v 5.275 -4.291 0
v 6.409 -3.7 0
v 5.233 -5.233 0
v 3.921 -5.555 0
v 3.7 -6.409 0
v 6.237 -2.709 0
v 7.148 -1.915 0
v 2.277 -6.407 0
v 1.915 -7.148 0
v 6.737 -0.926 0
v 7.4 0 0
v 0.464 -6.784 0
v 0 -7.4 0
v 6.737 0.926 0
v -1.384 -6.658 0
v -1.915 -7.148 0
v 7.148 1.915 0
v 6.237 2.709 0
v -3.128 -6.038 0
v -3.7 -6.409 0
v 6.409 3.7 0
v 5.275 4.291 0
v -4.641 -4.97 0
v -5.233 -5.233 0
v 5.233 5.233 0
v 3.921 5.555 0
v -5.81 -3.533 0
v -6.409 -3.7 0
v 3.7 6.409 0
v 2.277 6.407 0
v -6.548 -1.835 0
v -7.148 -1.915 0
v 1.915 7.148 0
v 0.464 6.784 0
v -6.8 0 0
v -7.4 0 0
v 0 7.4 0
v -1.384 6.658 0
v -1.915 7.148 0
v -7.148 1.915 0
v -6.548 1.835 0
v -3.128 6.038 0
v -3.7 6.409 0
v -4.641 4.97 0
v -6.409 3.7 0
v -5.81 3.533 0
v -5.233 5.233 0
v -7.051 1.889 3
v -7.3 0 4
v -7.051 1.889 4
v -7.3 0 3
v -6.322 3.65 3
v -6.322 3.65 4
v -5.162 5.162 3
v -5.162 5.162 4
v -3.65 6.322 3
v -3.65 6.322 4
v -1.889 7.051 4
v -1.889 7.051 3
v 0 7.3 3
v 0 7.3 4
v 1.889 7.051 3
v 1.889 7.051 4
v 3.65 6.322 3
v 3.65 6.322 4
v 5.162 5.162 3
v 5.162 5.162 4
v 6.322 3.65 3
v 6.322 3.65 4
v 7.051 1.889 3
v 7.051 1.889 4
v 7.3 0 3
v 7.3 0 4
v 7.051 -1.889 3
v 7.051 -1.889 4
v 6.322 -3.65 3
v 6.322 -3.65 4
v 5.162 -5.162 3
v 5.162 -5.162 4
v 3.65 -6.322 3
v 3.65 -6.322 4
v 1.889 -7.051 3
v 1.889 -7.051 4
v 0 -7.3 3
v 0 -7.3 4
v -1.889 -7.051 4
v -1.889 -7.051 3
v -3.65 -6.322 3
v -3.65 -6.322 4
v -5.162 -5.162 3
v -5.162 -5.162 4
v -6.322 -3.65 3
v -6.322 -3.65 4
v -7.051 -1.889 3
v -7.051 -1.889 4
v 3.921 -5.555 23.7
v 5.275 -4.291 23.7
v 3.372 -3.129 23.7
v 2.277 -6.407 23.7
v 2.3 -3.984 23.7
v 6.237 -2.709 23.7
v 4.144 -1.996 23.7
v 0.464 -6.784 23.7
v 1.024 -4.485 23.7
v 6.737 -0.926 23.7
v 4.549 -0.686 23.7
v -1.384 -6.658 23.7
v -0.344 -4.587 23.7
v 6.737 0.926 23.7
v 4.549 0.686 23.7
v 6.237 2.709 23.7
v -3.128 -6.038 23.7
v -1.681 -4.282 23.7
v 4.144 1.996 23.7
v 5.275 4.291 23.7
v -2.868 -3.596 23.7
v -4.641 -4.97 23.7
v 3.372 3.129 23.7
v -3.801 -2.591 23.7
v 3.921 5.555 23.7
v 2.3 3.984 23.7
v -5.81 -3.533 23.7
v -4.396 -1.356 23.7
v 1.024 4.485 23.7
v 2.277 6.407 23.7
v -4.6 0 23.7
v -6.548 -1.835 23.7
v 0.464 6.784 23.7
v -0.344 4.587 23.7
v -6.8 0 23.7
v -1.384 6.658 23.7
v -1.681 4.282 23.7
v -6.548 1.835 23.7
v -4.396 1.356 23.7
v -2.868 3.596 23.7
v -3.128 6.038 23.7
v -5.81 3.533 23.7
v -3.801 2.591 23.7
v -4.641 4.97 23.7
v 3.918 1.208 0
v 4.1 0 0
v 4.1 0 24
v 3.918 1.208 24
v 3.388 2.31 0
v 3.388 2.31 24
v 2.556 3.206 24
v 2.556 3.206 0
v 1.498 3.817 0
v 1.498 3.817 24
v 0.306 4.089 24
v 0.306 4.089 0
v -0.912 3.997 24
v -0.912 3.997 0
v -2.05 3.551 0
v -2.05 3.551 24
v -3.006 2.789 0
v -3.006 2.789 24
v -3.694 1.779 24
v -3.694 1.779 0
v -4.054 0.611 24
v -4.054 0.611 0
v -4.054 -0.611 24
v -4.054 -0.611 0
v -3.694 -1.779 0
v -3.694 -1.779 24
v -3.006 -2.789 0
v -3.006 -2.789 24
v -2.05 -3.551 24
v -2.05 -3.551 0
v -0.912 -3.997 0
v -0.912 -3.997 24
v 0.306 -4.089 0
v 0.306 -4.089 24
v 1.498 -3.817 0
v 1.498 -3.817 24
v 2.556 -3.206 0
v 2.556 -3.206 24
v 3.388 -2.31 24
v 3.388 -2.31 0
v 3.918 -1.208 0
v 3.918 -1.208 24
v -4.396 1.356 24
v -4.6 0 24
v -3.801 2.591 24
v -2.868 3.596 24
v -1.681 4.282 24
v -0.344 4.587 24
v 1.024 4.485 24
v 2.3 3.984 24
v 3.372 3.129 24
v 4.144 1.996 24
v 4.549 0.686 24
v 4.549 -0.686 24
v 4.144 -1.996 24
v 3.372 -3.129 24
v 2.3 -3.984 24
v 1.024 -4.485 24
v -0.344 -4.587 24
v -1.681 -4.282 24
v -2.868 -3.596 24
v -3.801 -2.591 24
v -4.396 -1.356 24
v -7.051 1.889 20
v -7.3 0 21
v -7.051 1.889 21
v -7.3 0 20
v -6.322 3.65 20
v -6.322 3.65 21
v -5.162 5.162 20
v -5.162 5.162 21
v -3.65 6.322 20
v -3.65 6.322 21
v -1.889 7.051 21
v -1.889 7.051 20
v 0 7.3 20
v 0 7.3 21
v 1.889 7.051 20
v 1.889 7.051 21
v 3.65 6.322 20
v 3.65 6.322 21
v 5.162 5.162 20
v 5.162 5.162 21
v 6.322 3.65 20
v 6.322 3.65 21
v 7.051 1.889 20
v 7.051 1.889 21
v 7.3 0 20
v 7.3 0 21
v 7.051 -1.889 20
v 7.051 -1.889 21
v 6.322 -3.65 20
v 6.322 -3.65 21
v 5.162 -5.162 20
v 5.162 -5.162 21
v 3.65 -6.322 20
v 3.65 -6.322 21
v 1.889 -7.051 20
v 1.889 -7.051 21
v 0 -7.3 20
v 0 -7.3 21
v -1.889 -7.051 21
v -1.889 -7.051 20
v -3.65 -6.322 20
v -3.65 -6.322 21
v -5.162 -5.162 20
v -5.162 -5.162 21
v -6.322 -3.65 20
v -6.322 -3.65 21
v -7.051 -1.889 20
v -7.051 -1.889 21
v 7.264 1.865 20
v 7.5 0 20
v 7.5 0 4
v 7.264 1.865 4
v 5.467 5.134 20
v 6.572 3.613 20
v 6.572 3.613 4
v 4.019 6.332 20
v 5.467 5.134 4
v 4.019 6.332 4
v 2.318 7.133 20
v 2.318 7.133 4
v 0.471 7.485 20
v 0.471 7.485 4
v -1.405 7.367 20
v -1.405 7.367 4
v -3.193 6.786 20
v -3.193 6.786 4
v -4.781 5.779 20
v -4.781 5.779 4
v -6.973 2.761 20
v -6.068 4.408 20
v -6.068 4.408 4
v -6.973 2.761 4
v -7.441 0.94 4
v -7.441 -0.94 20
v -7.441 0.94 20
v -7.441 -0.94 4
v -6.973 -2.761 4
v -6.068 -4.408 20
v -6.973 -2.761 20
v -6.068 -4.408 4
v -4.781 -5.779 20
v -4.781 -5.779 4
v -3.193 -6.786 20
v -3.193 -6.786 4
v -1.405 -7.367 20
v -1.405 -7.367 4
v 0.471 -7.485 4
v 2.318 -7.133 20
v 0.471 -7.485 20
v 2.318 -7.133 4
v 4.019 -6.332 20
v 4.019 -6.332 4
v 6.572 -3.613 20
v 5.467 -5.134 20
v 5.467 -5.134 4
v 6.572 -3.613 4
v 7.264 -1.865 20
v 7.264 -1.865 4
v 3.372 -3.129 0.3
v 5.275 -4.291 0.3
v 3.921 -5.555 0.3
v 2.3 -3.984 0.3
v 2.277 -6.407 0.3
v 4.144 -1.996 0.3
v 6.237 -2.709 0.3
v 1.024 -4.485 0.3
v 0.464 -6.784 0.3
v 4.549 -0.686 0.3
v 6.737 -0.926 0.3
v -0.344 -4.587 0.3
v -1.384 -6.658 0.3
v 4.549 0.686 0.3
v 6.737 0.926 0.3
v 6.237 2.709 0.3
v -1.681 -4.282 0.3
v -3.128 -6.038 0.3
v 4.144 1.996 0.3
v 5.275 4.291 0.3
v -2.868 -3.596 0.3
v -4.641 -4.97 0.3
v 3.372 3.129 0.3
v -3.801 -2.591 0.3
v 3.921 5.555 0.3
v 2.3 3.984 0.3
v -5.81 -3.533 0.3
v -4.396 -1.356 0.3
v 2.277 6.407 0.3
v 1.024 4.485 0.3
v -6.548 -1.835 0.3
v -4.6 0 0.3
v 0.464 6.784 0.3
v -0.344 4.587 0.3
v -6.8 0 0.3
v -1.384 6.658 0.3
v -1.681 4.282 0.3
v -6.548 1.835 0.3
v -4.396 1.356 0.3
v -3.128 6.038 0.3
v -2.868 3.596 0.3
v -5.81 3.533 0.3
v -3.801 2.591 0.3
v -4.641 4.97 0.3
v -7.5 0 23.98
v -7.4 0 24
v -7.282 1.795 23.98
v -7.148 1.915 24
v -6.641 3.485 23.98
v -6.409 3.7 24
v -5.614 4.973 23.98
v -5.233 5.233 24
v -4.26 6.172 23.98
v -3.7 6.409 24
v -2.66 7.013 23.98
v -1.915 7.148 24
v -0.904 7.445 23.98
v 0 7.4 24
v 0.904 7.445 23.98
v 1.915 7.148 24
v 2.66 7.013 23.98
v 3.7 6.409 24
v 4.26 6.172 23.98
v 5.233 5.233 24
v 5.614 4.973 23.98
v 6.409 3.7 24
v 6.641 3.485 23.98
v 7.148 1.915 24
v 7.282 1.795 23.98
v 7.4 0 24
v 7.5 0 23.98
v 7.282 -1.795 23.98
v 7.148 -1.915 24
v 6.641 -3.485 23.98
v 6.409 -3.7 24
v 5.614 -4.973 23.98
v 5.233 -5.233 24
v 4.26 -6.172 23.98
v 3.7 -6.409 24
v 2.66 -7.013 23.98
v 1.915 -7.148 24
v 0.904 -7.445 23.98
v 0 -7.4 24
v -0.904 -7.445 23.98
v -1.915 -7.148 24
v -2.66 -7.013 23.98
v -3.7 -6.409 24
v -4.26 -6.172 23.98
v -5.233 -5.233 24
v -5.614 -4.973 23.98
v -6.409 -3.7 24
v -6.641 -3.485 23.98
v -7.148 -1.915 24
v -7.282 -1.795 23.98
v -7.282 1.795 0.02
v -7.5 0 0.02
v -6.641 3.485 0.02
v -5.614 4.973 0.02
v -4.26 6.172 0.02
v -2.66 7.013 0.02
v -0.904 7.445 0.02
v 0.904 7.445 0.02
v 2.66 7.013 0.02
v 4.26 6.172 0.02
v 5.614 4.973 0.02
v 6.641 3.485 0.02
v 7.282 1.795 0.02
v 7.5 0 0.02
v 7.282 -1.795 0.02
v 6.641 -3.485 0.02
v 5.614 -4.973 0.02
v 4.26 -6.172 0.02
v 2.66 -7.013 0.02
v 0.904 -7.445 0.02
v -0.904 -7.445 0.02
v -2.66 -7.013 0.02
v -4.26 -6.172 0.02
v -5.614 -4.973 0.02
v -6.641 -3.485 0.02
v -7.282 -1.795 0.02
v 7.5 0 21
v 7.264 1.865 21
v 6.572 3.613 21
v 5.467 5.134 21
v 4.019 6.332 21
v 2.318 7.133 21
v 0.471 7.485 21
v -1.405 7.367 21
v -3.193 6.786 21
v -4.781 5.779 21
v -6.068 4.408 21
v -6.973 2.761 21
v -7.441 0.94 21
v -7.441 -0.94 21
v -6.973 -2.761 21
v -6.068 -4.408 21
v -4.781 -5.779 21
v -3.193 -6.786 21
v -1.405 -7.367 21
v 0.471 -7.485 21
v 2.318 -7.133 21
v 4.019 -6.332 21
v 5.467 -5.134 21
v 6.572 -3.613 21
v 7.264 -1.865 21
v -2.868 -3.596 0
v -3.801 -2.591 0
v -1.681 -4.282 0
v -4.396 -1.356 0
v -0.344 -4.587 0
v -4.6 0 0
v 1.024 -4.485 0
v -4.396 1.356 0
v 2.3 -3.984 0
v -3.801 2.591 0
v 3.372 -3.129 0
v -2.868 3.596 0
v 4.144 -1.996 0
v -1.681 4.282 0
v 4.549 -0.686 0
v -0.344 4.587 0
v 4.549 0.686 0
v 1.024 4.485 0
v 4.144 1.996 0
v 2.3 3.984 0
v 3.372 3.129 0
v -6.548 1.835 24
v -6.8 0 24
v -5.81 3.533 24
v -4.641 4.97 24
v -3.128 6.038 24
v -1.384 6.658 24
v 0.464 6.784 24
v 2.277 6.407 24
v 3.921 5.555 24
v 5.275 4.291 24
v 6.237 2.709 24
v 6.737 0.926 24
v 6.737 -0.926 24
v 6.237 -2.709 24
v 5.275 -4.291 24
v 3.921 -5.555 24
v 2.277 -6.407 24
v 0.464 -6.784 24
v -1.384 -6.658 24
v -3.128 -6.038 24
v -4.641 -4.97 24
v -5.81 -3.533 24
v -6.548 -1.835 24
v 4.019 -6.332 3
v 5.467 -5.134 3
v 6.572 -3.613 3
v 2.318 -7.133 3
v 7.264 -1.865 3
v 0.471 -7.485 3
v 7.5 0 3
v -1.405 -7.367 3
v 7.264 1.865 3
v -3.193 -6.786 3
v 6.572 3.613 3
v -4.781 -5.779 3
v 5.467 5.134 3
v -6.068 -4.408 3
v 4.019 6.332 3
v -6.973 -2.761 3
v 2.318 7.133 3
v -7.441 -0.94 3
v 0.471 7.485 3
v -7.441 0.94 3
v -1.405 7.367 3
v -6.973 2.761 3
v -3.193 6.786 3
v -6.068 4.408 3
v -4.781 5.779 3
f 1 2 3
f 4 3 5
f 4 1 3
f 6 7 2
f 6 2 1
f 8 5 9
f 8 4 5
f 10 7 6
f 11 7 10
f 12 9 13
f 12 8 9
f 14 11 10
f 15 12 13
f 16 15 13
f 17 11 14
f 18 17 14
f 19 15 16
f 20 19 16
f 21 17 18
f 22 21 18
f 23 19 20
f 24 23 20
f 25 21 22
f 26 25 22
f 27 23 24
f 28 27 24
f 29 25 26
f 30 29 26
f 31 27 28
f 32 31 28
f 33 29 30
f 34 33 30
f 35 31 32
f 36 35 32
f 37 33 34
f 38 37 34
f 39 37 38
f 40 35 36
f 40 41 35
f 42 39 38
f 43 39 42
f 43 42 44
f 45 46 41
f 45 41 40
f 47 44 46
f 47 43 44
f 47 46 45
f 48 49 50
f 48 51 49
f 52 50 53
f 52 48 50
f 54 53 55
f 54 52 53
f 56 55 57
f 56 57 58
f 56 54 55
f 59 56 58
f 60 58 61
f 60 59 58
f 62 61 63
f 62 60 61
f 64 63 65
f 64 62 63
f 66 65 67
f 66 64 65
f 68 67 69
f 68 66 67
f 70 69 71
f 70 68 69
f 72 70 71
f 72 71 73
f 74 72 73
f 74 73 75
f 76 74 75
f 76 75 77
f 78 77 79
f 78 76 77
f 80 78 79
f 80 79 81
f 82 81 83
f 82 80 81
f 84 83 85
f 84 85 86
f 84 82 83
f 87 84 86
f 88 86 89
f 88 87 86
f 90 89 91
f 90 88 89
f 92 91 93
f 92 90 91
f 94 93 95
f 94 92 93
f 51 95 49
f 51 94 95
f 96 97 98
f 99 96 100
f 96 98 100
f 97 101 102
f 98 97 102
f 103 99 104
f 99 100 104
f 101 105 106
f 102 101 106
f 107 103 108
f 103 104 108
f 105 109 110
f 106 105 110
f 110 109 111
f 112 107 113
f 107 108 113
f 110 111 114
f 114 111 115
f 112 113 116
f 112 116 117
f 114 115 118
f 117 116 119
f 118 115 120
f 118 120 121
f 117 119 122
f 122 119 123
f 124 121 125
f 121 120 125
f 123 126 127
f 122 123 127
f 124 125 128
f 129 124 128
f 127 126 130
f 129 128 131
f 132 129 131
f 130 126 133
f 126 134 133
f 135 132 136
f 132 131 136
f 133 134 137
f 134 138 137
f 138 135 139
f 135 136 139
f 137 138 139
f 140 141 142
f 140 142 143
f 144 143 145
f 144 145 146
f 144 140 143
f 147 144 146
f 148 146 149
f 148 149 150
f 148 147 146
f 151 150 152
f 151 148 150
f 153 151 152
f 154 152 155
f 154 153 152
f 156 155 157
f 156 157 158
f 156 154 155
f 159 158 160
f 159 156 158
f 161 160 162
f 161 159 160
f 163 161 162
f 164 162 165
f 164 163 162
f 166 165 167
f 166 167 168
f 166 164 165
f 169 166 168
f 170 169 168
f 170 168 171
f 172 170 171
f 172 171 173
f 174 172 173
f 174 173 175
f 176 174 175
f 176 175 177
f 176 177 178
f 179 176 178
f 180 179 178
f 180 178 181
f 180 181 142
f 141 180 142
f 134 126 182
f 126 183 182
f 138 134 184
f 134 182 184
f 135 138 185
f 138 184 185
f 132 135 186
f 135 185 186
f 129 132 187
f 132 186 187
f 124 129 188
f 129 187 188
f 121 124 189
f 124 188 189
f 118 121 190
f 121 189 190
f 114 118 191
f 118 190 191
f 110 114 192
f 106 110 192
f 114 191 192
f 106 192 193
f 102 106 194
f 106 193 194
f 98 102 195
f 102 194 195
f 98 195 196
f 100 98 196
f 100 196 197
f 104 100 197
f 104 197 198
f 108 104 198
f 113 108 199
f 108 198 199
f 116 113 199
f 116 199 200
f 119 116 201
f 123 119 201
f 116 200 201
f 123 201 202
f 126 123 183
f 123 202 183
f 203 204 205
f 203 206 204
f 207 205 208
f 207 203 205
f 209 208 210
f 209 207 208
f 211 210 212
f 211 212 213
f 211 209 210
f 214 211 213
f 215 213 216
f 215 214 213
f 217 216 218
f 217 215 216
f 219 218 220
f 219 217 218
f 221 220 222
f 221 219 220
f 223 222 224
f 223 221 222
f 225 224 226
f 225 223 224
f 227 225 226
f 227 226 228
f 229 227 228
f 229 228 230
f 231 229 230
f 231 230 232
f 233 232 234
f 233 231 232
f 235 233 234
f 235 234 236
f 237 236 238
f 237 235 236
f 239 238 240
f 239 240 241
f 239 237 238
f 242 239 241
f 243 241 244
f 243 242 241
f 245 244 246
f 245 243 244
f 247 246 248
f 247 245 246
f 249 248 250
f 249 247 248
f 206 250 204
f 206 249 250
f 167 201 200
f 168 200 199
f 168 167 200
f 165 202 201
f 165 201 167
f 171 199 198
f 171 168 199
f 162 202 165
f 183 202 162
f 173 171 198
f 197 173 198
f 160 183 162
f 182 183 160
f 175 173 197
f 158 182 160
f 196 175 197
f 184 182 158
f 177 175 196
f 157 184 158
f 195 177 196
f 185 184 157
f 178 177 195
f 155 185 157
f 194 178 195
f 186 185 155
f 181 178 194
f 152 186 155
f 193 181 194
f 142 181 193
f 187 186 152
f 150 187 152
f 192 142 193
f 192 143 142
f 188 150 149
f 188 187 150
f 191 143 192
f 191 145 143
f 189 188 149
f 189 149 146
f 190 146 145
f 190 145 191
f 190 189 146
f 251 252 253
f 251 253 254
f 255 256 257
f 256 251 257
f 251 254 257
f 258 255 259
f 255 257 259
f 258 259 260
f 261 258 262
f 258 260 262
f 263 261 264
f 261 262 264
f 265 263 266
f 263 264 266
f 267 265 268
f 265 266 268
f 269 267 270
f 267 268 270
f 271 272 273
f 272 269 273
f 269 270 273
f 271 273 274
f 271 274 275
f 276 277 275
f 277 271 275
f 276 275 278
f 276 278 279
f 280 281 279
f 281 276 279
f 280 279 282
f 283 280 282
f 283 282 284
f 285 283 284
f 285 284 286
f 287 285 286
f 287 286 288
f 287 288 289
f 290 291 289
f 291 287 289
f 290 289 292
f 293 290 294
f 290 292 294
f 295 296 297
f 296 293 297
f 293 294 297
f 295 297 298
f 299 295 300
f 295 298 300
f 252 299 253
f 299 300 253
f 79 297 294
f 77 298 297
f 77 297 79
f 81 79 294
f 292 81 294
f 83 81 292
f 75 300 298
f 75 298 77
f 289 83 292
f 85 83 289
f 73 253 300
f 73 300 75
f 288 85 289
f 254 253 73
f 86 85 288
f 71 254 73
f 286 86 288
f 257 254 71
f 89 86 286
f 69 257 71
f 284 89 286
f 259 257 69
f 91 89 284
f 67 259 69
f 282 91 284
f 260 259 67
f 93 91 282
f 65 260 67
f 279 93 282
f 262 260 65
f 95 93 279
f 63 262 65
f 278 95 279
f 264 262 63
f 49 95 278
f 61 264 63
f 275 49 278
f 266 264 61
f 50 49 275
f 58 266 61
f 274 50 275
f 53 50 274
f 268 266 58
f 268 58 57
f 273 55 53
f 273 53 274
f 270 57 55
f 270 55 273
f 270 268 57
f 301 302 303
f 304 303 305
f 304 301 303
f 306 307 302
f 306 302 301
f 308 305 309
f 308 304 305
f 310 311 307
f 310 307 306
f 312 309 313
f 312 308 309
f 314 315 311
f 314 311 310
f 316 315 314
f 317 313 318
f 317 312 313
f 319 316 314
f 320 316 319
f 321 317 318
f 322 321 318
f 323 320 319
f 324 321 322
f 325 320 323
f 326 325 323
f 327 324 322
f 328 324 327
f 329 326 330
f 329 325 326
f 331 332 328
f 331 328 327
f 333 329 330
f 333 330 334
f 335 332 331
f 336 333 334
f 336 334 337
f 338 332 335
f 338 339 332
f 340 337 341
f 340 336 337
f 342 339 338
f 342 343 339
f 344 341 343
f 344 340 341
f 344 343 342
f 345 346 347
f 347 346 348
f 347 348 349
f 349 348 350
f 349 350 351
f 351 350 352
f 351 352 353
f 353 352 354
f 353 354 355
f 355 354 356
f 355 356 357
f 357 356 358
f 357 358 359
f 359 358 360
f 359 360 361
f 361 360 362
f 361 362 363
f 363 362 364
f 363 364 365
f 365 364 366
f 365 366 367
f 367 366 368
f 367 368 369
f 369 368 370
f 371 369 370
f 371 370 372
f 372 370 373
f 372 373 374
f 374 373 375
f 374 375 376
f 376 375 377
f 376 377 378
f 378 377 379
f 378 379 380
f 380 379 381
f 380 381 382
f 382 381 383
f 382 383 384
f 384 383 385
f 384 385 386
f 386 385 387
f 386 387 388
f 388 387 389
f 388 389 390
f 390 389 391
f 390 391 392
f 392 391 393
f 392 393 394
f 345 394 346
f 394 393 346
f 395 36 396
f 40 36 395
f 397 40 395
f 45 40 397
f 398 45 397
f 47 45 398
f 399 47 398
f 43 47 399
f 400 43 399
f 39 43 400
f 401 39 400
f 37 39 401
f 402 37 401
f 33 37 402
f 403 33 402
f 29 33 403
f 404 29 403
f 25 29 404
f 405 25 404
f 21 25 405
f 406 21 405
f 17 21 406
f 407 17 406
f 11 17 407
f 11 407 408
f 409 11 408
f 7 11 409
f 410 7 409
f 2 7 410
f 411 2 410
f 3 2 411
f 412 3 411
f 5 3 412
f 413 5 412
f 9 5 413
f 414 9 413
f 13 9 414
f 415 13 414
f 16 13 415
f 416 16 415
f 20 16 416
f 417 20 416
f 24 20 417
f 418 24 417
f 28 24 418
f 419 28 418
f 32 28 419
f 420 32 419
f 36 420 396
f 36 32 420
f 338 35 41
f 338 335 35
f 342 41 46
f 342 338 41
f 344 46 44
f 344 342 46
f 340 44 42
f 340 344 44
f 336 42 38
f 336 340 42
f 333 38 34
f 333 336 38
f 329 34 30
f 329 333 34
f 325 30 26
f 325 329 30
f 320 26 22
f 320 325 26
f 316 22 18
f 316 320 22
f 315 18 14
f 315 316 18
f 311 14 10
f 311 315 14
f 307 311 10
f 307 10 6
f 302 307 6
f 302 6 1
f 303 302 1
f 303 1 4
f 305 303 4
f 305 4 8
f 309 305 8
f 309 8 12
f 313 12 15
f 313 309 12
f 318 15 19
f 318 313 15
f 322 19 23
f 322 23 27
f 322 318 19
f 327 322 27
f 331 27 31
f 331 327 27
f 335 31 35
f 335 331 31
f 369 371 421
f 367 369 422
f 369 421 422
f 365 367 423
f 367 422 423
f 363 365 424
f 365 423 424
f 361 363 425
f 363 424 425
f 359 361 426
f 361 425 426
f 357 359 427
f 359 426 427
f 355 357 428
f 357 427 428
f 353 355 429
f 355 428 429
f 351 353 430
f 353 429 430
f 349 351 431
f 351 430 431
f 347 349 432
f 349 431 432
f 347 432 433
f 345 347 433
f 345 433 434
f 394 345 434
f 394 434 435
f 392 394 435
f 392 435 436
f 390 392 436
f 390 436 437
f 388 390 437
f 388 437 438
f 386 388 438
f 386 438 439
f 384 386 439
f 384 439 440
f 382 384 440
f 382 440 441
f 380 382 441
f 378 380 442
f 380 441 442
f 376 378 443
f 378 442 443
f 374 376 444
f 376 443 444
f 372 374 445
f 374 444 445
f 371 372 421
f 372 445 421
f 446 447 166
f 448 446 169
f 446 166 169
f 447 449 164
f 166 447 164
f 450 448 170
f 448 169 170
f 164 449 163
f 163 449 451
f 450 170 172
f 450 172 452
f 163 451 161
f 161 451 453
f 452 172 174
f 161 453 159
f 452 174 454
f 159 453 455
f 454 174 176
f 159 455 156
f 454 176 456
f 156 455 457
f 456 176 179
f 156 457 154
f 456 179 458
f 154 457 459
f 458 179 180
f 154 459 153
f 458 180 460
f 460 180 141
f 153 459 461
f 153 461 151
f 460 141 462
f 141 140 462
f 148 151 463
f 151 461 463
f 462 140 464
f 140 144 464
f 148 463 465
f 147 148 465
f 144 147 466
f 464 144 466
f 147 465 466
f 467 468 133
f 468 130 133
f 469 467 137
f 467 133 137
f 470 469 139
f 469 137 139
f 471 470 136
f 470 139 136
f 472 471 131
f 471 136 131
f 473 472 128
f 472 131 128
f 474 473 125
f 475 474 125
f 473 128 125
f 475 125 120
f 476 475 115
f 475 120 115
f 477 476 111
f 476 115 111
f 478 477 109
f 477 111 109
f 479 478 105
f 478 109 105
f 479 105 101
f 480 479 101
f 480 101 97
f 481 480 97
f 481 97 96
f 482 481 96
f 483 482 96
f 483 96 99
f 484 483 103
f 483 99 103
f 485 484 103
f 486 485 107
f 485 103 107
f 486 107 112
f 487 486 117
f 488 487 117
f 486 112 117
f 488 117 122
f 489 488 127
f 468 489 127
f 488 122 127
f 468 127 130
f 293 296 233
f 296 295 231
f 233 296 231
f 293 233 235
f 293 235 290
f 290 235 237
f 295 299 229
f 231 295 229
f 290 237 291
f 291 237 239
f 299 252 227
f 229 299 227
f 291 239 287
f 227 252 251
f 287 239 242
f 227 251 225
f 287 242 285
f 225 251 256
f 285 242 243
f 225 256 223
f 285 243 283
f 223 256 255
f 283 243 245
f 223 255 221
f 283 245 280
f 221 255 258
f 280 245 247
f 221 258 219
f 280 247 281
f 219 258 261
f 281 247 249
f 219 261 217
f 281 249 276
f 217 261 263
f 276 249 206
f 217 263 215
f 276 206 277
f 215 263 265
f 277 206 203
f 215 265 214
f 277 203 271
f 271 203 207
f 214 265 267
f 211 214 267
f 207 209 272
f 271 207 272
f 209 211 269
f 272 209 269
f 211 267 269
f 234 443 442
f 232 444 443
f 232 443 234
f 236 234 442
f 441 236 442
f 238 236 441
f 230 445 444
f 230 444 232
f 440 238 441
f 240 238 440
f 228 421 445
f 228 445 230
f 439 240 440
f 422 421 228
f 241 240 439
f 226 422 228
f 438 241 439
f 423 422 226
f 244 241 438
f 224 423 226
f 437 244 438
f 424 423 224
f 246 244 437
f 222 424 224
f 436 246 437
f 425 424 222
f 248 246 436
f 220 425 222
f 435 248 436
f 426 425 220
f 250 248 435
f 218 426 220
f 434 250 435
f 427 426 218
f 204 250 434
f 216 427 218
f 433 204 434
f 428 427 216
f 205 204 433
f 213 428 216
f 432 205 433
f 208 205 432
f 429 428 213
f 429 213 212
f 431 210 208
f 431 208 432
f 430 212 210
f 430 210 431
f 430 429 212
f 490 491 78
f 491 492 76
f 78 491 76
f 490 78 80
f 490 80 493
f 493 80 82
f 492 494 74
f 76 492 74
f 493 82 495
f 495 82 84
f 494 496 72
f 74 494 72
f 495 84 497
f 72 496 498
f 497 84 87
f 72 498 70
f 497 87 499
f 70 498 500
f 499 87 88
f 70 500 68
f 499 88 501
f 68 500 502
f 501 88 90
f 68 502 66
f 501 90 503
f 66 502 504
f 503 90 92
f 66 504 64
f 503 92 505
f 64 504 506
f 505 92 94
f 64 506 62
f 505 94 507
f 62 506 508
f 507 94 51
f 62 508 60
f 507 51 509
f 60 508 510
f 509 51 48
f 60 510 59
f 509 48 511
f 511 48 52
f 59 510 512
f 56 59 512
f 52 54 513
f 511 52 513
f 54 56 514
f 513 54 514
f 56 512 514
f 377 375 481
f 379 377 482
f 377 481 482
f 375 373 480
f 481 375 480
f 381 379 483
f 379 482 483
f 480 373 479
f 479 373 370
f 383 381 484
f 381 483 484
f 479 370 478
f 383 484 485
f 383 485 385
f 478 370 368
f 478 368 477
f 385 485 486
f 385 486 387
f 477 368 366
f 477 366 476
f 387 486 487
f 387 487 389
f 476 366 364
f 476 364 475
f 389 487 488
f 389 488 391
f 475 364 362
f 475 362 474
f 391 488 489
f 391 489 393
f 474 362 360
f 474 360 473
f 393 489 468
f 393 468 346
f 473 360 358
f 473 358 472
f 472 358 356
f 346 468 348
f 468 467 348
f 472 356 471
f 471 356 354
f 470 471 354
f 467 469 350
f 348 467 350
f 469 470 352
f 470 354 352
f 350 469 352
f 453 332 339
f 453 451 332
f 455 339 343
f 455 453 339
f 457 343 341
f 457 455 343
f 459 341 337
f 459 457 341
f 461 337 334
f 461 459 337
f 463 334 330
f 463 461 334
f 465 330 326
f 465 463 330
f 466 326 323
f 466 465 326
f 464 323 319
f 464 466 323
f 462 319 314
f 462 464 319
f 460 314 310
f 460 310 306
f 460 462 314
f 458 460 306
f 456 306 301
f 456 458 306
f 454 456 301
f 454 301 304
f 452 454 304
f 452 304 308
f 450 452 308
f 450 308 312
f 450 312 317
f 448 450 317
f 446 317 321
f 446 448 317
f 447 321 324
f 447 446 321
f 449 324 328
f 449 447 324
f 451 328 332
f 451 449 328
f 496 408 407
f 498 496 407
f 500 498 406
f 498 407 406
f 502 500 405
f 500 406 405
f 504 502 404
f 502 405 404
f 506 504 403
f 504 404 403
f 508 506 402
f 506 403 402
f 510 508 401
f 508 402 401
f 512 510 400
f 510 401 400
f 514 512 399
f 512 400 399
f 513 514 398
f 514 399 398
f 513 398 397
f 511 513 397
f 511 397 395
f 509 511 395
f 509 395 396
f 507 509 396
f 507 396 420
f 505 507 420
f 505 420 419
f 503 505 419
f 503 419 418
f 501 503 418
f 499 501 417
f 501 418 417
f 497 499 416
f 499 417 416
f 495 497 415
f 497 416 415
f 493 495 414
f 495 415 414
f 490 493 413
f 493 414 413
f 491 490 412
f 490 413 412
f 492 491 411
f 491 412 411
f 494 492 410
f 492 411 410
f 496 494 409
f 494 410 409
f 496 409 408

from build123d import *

# Parameters (mm, degrees)
CROQUIS1_R              = 7.5
CROQUIS1_R_2            = 4.1
SALIENTE_EXTRUIR1_DEPTH = 24
CROQUIS2_W              = 0.4
CROQUIS2_H              = 1


with BuildPart() as part:
    # Croquis1 → Saliente-Extruir1 (new body)
    with BuildSketch(Plane.XY):
        Circle(CROQUIS1_R)
        Circle(CROQUIS1_R_2, mode=Mode.SUBTRACT)
    extrude(amount=SALIENTE_EXTRUIR1_DEPTH)

    # Croquis2 → Cortar-Revolución1 (revolve, cut)
    with BuildSketch(Plane(origin=(0, 0, 0), x_dir=(1, 0, 0), z_dir=(0, 1, 0))):
        Polygon((-7.5, -0.02), (-7.4, 0), (-6.8, 0), (-6.8, -0.3), (-4.6, -0.3), (-4.6, 0), (-4.1, 0), (-4.1, 0.7), (-7.5, 0.7), align=None)
        Polygon((-7.5, -24.7), (-7.5, -23.98), (-7.4, -24), (-6.8, -24), (-6.8, -23.7), (-4.6, -23.7), (-4.6, -24), (-4.1, -24), (-4.1, -24.7), align=None)
        with Locations((-7.5, -3.5)):
            Rectangle(CROQUIS2_W, CROQUIS2_H)
        with Locations((-7.5, -20.5)):
            Rectangle(CROQUIS2_W, CROQUIS2_H)
    revolve(axis=Axis((0, 0, 24), (0, 0, -1)), mode=Mode.SUBTRACT)


solid = part.part
